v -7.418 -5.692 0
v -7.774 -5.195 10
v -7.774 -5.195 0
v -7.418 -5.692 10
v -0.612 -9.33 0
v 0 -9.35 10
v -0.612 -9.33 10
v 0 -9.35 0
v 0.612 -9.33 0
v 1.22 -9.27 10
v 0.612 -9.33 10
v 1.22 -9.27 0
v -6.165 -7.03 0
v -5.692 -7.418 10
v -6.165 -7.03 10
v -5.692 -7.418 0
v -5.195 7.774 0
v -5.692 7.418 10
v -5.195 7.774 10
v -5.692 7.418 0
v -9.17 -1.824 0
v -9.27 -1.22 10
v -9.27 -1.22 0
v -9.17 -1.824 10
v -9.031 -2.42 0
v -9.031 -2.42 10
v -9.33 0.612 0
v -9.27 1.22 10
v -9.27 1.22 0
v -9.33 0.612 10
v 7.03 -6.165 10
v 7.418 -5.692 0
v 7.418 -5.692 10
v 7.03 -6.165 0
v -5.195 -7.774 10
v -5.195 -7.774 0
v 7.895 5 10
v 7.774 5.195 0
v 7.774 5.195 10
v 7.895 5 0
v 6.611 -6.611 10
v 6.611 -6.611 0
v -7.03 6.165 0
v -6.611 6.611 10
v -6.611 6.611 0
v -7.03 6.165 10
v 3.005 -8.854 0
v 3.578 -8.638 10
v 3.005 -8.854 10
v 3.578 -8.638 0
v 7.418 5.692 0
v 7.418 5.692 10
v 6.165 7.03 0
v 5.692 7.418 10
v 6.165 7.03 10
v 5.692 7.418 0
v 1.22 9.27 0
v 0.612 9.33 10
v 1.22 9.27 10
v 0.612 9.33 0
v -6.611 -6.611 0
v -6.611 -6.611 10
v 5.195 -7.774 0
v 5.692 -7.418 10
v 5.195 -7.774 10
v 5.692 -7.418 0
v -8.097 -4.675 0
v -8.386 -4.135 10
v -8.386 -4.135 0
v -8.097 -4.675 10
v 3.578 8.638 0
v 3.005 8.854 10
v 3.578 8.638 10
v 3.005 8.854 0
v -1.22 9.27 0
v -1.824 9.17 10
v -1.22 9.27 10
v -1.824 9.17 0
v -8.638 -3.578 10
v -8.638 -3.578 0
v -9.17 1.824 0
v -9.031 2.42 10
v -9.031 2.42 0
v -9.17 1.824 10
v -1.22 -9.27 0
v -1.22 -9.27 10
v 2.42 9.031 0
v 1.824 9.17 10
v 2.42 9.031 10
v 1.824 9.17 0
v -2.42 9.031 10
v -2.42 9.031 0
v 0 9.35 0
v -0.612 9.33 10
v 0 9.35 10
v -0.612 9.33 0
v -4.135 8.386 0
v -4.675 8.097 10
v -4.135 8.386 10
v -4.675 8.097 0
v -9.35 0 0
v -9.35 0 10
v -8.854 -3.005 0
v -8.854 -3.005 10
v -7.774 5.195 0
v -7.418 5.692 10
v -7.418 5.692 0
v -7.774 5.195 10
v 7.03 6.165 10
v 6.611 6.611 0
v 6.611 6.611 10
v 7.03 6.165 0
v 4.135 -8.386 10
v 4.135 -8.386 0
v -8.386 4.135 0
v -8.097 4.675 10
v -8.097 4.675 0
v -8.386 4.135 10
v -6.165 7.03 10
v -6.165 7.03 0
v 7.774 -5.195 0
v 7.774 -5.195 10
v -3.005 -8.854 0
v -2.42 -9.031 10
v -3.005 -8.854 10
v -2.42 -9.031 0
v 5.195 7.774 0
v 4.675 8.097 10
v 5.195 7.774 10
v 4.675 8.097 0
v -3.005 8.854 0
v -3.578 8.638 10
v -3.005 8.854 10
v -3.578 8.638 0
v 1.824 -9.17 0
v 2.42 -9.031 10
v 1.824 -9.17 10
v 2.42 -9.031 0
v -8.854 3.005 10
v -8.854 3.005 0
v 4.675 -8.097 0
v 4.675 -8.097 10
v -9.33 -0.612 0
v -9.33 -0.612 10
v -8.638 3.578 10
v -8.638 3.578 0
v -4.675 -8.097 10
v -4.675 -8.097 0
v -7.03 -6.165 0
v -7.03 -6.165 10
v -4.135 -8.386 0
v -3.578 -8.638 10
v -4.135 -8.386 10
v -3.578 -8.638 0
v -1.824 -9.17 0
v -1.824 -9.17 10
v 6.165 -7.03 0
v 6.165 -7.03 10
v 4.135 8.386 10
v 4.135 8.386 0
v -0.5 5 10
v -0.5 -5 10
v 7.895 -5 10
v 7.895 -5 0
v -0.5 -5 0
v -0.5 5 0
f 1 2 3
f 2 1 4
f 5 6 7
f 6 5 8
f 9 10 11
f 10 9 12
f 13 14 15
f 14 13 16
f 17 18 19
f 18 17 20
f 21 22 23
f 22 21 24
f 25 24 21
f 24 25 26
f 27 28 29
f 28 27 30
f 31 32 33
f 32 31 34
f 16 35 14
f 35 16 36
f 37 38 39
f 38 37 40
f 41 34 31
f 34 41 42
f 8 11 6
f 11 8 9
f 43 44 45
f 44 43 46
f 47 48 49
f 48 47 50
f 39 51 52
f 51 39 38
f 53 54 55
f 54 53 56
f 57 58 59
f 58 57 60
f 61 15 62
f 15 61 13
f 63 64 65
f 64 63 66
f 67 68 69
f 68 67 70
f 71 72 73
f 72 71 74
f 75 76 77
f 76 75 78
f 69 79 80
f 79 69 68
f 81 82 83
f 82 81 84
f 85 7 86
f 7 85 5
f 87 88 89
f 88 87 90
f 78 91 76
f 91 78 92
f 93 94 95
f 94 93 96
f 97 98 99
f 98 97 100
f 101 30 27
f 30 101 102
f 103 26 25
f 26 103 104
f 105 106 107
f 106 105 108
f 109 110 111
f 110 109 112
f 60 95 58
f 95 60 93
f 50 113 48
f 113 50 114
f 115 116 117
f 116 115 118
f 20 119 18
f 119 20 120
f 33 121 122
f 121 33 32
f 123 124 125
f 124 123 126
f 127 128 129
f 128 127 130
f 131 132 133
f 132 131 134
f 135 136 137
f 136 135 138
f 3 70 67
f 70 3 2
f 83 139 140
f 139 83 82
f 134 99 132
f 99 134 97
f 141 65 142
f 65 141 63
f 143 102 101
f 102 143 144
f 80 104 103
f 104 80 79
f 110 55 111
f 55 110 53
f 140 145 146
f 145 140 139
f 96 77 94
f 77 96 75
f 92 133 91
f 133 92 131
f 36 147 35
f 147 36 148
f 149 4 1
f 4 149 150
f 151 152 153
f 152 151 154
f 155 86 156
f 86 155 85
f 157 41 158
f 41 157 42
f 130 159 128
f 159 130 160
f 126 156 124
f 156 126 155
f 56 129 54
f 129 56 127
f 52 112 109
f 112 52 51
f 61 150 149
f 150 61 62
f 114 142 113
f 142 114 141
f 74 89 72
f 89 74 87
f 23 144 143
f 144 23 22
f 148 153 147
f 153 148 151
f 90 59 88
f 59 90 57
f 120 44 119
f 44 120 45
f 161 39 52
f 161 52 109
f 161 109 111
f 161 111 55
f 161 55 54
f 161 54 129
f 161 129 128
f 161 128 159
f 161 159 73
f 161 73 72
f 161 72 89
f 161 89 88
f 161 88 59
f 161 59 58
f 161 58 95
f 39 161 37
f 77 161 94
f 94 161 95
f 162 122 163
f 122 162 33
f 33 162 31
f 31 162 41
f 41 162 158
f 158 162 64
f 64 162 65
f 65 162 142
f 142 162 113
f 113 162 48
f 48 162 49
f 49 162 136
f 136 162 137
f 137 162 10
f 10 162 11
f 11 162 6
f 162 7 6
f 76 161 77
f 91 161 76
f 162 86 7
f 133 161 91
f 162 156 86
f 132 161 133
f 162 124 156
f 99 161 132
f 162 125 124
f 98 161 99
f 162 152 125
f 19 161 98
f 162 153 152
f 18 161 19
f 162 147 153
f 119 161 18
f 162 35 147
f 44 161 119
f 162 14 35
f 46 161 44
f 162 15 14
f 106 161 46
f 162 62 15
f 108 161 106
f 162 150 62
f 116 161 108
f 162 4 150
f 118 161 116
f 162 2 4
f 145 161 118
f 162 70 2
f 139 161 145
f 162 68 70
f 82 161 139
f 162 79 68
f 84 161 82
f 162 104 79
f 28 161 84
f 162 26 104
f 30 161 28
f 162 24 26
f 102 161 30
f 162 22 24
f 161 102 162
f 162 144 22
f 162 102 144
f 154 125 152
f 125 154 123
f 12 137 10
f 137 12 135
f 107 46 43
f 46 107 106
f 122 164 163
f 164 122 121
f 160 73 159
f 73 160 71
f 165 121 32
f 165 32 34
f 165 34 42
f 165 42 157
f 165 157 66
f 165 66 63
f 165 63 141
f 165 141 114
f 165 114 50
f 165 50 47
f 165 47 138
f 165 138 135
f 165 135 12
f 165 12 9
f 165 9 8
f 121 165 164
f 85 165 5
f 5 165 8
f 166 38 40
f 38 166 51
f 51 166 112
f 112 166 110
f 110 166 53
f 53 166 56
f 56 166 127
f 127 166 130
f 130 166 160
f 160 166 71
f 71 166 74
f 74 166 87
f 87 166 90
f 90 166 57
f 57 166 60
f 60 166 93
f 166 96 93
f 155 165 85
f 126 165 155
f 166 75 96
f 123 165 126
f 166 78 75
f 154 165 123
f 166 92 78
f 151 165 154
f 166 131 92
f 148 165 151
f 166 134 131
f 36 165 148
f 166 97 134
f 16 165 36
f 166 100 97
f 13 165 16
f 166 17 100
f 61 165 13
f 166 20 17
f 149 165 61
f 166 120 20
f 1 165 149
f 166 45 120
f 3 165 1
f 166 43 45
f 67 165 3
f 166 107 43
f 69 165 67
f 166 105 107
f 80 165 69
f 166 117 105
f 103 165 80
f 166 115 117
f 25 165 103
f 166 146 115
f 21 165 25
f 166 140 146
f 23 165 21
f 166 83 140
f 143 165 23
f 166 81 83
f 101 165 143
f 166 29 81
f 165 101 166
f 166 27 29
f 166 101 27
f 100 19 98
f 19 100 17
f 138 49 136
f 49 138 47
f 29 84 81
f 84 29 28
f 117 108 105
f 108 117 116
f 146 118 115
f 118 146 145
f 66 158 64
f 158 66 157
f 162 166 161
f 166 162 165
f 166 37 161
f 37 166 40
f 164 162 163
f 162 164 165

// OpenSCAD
// Stand rod and tubing clip - prints flat as a 2-D profile in the XY plane
// Units: mm. $fn = 96 for the ring circles.

// ---------------- Parameters ----------------
ring_d        = 12.7;   // stand rod ring inner diameter
wall_r        = 3;      // stand rod ring wall thickness
opening_w     = 10;     // stand rod ring opening width (along -X)
opening_y     = 5;      // stand rod ring opening half-height (y limit)

tubing_d      = 6;      // tubing ring inner diameter
tubing_wall   = 2;      // tubing ring wall thickness
tubing_x      = 15;     // tubing ring centre X position
tubing_open_w = 4.5;    // tubing ring opening width (along +X)
tubing_open_h = 2.25;   // tubing ring opening half-height (y limit)

bridge_x1     = 8;      // bridge start X
bridge_x2     = 12;     // bridge end X
bridge_w      = 6;      // bridge width (Y)

eps           = 0.5;    // cutter overshoot past faces
height        = 10;     // extrusion height (Z)

// ---------------- Derived ----------------
outer_d = ring_d + 2 * wall_r;   // stand rod ring outer diameter

// ---------------- Model ----------------
difference() {
    // Stand rod ring, centred at origin
    cylinder(d = outer_d, h = height, $fn = 96);
    translate([-eps, -opening_y, 0])
        cube([opening_w + 2 * eps, 2 * opening_y, height]);

    // Tubing ring, centred at x = 15, y = 0
    translate([tubing_x, 0, 0])
        cylinder(d = tubing_d + 2 * tubing_wall, h = height, $fn = 96);
    translate([tubing_x + tubing_open_w / 2, -tubing_open_h, 0])
        cube([tubing_open_w, 2 * tubing_open_h, height]);

    // Solid bridge joining the two rings (y = -3 to +3, x = 8 to 12)
    translate([bridge_x1, -bridge_w / 2, 0])
        cube([bridge_x2 - bridge_x1 + eps, bridge_w, height]);
}
